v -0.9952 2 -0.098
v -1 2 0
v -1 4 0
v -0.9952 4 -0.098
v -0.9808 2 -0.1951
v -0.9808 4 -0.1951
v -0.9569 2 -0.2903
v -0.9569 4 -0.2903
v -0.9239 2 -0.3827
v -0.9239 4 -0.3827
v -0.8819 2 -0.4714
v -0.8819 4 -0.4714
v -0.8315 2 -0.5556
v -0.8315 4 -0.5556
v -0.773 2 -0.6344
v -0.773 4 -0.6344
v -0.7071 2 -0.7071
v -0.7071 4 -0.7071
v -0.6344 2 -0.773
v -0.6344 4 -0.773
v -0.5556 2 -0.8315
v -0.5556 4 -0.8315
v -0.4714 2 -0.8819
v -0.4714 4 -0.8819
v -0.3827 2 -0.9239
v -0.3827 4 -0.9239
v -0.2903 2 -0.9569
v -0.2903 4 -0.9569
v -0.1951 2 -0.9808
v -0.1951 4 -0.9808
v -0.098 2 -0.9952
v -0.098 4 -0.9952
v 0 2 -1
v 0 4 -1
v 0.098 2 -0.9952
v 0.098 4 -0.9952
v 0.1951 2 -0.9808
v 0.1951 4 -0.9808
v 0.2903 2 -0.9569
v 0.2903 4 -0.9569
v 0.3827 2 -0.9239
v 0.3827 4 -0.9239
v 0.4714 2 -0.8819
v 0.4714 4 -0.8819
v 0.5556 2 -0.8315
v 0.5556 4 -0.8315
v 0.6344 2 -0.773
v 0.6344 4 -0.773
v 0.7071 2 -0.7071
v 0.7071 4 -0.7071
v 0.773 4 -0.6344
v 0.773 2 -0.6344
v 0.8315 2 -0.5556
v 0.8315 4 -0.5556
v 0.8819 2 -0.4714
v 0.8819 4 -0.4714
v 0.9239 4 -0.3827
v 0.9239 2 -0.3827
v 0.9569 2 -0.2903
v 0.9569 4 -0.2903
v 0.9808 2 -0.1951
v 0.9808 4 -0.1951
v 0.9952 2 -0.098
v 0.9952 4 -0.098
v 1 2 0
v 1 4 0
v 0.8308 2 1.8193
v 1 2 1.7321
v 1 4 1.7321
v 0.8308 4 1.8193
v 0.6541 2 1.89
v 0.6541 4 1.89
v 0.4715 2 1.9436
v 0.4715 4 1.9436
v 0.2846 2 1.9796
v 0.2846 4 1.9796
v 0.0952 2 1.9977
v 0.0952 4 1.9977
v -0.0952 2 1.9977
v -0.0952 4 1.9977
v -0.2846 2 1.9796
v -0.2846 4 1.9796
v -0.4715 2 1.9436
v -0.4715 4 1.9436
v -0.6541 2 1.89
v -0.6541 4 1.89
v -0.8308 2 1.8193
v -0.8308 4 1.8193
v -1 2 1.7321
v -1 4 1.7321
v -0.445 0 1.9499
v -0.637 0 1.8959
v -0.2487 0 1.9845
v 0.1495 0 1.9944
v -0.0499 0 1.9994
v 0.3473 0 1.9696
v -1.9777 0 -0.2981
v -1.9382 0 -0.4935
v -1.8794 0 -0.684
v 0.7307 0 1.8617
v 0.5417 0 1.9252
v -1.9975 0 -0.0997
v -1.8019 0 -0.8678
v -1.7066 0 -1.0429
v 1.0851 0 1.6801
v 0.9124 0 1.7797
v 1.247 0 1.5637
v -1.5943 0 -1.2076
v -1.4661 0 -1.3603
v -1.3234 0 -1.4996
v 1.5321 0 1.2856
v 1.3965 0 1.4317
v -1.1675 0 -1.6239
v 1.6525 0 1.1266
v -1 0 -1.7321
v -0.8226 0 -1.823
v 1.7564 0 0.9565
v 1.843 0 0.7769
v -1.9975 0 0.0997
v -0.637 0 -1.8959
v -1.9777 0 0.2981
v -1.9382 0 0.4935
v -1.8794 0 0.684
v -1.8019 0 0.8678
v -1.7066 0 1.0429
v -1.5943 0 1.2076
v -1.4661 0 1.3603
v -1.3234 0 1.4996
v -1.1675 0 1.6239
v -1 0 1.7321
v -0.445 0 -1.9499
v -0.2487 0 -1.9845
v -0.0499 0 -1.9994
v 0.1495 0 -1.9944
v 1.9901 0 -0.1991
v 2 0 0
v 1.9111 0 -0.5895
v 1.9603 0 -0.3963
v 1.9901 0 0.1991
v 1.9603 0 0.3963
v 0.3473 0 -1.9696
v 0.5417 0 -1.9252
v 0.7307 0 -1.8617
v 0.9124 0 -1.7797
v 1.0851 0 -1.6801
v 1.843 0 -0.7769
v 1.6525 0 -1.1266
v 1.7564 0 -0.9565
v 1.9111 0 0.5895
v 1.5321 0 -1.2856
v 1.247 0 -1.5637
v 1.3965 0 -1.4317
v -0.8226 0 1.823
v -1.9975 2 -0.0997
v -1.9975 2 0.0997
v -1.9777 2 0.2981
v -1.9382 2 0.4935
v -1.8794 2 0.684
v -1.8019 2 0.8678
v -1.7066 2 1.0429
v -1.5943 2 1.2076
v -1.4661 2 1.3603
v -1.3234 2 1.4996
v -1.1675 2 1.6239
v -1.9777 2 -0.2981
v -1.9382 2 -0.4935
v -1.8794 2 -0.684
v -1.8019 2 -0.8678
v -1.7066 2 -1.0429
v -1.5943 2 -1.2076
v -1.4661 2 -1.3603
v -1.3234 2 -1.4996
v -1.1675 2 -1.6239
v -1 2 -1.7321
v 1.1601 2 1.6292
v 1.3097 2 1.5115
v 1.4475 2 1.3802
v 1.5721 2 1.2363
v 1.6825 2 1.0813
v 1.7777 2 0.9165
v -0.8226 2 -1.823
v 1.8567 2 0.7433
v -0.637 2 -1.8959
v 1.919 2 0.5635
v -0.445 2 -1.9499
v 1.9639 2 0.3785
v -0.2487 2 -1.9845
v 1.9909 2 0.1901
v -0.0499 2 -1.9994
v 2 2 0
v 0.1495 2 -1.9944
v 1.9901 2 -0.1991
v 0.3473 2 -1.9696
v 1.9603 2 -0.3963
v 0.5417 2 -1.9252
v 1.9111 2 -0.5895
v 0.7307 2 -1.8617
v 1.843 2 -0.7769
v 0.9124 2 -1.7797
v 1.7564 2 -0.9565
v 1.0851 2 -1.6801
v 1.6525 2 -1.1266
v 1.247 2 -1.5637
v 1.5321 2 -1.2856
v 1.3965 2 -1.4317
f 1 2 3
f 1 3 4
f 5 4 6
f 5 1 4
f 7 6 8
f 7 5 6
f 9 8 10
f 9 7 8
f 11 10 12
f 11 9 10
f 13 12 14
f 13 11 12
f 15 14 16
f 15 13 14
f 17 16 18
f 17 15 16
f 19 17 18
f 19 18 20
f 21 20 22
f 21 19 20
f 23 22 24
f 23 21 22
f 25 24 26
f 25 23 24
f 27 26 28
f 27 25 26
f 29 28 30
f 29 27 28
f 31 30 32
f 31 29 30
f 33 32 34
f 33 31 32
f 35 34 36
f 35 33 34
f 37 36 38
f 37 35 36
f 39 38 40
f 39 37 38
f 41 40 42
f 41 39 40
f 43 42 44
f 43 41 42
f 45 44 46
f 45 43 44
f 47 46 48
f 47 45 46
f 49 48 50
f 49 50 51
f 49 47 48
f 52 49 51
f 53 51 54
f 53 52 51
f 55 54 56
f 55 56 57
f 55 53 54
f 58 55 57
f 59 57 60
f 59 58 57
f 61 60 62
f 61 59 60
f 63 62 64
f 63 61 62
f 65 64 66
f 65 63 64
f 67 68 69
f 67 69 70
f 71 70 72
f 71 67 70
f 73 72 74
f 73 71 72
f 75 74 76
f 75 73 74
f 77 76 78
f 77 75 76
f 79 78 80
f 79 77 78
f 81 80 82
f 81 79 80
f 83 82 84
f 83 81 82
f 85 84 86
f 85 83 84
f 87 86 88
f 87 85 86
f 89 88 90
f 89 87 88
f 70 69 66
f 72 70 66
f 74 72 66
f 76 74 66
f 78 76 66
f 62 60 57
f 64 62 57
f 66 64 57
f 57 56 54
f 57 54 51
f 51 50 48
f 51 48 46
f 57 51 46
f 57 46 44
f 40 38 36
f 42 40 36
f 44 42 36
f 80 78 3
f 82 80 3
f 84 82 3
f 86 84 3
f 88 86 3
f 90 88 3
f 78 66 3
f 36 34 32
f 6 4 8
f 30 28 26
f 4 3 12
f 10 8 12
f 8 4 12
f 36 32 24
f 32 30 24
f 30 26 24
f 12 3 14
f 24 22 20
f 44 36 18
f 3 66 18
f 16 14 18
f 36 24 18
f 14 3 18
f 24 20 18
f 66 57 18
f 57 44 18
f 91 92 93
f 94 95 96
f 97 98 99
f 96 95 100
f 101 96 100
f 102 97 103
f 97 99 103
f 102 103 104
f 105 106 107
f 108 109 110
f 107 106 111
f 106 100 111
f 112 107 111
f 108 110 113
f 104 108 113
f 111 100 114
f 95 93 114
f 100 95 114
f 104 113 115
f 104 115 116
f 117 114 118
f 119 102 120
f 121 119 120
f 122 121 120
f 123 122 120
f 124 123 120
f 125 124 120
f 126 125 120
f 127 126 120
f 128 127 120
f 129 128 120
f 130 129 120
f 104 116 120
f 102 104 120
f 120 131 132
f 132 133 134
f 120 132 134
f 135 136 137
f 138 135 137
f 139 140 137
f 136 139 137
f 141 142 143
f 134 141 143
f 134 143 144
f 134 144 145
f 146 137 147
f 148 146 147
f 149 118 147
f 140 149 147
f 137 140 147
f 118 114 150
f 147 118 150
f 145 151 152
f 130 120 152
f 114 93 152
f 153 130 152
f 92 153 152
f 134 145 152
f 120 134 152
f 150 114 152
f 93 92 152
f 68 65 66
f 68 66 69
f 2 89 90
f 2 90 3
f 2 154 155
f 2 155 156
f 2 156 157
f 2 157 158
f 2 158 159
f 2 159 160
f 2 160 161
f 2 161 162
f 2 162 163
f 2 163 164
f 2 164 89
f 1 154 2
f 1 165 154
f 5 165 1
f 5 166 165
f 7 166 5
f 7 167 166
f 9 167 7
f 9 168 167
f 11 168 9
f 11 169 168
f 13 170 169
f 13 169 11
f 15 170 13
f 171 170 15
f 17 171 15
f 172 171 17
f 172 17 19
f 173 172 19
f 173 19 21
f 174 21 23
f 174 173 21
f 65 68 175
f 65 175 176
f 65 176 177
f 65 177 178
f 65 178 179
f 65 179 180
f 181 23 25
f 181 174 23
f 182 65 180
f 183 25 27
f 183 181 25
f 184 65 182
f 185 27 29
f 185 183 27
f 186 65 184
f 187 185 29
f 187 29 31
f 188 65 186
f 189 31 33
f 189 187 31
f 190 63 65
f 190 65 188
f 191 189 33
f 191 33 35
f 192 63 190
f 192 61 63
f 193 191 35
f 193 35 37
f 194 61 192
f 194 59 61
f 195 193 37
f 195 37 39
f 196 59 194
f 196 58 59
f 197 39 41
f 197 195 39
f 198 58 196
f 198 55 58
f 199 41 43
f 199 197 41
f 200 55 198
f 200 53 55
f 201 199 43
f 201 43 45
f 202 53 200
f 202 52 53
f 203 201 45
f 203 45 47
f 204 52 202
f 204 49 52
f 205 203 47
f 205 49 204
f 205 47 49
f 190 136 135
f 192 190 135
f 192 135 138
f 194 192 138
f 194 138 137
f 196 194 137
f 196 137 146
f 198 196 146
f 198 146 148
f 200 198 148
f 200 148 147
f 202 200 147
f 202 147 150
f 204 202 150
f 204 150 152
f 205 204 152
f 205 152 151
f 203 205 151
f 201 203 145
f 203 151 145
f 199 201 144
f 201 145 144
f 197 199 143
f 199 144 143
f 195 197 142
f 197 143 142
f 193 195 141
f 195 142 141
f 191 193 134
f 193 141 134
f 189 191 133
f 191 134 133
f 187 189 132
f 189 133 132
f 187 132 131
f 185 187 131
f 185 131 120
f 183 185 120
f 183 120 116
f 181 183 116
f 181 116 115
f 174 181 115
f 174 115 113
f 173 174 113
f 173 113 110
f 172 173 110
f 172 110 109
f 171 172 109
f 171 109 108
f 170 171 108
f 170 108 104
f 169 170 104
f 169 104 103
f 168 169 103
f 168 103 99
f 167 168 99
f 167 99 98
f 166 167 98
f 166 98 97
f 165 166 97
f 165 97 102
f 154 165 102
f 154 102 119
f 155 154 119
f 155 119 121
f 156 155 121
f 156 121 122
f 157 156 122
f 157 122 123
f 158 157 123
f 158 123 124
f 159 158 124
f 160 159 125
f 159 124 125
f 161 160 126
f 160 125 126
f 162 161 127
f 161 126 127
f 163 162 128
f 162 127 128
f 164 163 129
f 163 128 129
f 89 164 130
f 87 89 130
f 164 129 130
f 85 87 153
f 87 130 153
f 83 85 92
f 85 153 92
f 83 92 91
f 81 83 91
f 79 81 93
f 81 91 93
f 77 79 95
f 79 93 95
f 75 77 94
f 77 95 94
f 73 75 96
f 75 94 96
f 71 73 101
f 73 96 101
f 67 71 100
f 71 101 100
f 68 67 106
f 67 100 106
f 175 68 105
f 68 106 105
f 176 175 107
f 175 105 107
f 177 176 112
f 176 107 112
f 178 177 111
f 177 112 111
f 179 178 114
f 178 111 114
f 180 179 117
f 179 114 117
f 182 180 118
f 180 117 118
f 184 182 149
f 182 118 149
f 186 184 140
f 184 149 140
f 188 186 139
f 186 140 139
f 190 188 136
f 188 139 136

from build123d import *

# Parameters (mm, degrees)
SKETCH1_R           = 2
BOSS_EXTRUDE1_DEPTH = 2
BOSS_EXTRUDE2_DEPTH = 2


with BuildPart() as part:
    # Sketch1 → Boss-Extrude1 (new body)
    with BuildSketch(Plane(origin=(0, 0, 0), x_dir=(1, 0, 0), z_dir=(0, 1, 0))):
        Circle(SKETCH1_R)
    extrude(amount=BOSS_EXTRUDE1_DEPTH)

    # Sketch2 → Boss-Extrude2 (add)
    with BuildSketch(Plane(origin=(0, 2, 0), x_dir=(1, 0, 0), z_dir=(0, 1, 0))):
        with BuildLine():
            Line((-1, -1.732050808), (-1, 0))
            ThreePointArc((-1, 0), (0, 1), (1, 0))
            Line((1, 0), (1, -1.732050808))
            ThreePointArc((1, -1.732050808), (0, -2), (-1, -1.732050808))
        make_face()
    extrude(amount=BOSS_EXTRUDE2_DEPTH)


solid = part.part
